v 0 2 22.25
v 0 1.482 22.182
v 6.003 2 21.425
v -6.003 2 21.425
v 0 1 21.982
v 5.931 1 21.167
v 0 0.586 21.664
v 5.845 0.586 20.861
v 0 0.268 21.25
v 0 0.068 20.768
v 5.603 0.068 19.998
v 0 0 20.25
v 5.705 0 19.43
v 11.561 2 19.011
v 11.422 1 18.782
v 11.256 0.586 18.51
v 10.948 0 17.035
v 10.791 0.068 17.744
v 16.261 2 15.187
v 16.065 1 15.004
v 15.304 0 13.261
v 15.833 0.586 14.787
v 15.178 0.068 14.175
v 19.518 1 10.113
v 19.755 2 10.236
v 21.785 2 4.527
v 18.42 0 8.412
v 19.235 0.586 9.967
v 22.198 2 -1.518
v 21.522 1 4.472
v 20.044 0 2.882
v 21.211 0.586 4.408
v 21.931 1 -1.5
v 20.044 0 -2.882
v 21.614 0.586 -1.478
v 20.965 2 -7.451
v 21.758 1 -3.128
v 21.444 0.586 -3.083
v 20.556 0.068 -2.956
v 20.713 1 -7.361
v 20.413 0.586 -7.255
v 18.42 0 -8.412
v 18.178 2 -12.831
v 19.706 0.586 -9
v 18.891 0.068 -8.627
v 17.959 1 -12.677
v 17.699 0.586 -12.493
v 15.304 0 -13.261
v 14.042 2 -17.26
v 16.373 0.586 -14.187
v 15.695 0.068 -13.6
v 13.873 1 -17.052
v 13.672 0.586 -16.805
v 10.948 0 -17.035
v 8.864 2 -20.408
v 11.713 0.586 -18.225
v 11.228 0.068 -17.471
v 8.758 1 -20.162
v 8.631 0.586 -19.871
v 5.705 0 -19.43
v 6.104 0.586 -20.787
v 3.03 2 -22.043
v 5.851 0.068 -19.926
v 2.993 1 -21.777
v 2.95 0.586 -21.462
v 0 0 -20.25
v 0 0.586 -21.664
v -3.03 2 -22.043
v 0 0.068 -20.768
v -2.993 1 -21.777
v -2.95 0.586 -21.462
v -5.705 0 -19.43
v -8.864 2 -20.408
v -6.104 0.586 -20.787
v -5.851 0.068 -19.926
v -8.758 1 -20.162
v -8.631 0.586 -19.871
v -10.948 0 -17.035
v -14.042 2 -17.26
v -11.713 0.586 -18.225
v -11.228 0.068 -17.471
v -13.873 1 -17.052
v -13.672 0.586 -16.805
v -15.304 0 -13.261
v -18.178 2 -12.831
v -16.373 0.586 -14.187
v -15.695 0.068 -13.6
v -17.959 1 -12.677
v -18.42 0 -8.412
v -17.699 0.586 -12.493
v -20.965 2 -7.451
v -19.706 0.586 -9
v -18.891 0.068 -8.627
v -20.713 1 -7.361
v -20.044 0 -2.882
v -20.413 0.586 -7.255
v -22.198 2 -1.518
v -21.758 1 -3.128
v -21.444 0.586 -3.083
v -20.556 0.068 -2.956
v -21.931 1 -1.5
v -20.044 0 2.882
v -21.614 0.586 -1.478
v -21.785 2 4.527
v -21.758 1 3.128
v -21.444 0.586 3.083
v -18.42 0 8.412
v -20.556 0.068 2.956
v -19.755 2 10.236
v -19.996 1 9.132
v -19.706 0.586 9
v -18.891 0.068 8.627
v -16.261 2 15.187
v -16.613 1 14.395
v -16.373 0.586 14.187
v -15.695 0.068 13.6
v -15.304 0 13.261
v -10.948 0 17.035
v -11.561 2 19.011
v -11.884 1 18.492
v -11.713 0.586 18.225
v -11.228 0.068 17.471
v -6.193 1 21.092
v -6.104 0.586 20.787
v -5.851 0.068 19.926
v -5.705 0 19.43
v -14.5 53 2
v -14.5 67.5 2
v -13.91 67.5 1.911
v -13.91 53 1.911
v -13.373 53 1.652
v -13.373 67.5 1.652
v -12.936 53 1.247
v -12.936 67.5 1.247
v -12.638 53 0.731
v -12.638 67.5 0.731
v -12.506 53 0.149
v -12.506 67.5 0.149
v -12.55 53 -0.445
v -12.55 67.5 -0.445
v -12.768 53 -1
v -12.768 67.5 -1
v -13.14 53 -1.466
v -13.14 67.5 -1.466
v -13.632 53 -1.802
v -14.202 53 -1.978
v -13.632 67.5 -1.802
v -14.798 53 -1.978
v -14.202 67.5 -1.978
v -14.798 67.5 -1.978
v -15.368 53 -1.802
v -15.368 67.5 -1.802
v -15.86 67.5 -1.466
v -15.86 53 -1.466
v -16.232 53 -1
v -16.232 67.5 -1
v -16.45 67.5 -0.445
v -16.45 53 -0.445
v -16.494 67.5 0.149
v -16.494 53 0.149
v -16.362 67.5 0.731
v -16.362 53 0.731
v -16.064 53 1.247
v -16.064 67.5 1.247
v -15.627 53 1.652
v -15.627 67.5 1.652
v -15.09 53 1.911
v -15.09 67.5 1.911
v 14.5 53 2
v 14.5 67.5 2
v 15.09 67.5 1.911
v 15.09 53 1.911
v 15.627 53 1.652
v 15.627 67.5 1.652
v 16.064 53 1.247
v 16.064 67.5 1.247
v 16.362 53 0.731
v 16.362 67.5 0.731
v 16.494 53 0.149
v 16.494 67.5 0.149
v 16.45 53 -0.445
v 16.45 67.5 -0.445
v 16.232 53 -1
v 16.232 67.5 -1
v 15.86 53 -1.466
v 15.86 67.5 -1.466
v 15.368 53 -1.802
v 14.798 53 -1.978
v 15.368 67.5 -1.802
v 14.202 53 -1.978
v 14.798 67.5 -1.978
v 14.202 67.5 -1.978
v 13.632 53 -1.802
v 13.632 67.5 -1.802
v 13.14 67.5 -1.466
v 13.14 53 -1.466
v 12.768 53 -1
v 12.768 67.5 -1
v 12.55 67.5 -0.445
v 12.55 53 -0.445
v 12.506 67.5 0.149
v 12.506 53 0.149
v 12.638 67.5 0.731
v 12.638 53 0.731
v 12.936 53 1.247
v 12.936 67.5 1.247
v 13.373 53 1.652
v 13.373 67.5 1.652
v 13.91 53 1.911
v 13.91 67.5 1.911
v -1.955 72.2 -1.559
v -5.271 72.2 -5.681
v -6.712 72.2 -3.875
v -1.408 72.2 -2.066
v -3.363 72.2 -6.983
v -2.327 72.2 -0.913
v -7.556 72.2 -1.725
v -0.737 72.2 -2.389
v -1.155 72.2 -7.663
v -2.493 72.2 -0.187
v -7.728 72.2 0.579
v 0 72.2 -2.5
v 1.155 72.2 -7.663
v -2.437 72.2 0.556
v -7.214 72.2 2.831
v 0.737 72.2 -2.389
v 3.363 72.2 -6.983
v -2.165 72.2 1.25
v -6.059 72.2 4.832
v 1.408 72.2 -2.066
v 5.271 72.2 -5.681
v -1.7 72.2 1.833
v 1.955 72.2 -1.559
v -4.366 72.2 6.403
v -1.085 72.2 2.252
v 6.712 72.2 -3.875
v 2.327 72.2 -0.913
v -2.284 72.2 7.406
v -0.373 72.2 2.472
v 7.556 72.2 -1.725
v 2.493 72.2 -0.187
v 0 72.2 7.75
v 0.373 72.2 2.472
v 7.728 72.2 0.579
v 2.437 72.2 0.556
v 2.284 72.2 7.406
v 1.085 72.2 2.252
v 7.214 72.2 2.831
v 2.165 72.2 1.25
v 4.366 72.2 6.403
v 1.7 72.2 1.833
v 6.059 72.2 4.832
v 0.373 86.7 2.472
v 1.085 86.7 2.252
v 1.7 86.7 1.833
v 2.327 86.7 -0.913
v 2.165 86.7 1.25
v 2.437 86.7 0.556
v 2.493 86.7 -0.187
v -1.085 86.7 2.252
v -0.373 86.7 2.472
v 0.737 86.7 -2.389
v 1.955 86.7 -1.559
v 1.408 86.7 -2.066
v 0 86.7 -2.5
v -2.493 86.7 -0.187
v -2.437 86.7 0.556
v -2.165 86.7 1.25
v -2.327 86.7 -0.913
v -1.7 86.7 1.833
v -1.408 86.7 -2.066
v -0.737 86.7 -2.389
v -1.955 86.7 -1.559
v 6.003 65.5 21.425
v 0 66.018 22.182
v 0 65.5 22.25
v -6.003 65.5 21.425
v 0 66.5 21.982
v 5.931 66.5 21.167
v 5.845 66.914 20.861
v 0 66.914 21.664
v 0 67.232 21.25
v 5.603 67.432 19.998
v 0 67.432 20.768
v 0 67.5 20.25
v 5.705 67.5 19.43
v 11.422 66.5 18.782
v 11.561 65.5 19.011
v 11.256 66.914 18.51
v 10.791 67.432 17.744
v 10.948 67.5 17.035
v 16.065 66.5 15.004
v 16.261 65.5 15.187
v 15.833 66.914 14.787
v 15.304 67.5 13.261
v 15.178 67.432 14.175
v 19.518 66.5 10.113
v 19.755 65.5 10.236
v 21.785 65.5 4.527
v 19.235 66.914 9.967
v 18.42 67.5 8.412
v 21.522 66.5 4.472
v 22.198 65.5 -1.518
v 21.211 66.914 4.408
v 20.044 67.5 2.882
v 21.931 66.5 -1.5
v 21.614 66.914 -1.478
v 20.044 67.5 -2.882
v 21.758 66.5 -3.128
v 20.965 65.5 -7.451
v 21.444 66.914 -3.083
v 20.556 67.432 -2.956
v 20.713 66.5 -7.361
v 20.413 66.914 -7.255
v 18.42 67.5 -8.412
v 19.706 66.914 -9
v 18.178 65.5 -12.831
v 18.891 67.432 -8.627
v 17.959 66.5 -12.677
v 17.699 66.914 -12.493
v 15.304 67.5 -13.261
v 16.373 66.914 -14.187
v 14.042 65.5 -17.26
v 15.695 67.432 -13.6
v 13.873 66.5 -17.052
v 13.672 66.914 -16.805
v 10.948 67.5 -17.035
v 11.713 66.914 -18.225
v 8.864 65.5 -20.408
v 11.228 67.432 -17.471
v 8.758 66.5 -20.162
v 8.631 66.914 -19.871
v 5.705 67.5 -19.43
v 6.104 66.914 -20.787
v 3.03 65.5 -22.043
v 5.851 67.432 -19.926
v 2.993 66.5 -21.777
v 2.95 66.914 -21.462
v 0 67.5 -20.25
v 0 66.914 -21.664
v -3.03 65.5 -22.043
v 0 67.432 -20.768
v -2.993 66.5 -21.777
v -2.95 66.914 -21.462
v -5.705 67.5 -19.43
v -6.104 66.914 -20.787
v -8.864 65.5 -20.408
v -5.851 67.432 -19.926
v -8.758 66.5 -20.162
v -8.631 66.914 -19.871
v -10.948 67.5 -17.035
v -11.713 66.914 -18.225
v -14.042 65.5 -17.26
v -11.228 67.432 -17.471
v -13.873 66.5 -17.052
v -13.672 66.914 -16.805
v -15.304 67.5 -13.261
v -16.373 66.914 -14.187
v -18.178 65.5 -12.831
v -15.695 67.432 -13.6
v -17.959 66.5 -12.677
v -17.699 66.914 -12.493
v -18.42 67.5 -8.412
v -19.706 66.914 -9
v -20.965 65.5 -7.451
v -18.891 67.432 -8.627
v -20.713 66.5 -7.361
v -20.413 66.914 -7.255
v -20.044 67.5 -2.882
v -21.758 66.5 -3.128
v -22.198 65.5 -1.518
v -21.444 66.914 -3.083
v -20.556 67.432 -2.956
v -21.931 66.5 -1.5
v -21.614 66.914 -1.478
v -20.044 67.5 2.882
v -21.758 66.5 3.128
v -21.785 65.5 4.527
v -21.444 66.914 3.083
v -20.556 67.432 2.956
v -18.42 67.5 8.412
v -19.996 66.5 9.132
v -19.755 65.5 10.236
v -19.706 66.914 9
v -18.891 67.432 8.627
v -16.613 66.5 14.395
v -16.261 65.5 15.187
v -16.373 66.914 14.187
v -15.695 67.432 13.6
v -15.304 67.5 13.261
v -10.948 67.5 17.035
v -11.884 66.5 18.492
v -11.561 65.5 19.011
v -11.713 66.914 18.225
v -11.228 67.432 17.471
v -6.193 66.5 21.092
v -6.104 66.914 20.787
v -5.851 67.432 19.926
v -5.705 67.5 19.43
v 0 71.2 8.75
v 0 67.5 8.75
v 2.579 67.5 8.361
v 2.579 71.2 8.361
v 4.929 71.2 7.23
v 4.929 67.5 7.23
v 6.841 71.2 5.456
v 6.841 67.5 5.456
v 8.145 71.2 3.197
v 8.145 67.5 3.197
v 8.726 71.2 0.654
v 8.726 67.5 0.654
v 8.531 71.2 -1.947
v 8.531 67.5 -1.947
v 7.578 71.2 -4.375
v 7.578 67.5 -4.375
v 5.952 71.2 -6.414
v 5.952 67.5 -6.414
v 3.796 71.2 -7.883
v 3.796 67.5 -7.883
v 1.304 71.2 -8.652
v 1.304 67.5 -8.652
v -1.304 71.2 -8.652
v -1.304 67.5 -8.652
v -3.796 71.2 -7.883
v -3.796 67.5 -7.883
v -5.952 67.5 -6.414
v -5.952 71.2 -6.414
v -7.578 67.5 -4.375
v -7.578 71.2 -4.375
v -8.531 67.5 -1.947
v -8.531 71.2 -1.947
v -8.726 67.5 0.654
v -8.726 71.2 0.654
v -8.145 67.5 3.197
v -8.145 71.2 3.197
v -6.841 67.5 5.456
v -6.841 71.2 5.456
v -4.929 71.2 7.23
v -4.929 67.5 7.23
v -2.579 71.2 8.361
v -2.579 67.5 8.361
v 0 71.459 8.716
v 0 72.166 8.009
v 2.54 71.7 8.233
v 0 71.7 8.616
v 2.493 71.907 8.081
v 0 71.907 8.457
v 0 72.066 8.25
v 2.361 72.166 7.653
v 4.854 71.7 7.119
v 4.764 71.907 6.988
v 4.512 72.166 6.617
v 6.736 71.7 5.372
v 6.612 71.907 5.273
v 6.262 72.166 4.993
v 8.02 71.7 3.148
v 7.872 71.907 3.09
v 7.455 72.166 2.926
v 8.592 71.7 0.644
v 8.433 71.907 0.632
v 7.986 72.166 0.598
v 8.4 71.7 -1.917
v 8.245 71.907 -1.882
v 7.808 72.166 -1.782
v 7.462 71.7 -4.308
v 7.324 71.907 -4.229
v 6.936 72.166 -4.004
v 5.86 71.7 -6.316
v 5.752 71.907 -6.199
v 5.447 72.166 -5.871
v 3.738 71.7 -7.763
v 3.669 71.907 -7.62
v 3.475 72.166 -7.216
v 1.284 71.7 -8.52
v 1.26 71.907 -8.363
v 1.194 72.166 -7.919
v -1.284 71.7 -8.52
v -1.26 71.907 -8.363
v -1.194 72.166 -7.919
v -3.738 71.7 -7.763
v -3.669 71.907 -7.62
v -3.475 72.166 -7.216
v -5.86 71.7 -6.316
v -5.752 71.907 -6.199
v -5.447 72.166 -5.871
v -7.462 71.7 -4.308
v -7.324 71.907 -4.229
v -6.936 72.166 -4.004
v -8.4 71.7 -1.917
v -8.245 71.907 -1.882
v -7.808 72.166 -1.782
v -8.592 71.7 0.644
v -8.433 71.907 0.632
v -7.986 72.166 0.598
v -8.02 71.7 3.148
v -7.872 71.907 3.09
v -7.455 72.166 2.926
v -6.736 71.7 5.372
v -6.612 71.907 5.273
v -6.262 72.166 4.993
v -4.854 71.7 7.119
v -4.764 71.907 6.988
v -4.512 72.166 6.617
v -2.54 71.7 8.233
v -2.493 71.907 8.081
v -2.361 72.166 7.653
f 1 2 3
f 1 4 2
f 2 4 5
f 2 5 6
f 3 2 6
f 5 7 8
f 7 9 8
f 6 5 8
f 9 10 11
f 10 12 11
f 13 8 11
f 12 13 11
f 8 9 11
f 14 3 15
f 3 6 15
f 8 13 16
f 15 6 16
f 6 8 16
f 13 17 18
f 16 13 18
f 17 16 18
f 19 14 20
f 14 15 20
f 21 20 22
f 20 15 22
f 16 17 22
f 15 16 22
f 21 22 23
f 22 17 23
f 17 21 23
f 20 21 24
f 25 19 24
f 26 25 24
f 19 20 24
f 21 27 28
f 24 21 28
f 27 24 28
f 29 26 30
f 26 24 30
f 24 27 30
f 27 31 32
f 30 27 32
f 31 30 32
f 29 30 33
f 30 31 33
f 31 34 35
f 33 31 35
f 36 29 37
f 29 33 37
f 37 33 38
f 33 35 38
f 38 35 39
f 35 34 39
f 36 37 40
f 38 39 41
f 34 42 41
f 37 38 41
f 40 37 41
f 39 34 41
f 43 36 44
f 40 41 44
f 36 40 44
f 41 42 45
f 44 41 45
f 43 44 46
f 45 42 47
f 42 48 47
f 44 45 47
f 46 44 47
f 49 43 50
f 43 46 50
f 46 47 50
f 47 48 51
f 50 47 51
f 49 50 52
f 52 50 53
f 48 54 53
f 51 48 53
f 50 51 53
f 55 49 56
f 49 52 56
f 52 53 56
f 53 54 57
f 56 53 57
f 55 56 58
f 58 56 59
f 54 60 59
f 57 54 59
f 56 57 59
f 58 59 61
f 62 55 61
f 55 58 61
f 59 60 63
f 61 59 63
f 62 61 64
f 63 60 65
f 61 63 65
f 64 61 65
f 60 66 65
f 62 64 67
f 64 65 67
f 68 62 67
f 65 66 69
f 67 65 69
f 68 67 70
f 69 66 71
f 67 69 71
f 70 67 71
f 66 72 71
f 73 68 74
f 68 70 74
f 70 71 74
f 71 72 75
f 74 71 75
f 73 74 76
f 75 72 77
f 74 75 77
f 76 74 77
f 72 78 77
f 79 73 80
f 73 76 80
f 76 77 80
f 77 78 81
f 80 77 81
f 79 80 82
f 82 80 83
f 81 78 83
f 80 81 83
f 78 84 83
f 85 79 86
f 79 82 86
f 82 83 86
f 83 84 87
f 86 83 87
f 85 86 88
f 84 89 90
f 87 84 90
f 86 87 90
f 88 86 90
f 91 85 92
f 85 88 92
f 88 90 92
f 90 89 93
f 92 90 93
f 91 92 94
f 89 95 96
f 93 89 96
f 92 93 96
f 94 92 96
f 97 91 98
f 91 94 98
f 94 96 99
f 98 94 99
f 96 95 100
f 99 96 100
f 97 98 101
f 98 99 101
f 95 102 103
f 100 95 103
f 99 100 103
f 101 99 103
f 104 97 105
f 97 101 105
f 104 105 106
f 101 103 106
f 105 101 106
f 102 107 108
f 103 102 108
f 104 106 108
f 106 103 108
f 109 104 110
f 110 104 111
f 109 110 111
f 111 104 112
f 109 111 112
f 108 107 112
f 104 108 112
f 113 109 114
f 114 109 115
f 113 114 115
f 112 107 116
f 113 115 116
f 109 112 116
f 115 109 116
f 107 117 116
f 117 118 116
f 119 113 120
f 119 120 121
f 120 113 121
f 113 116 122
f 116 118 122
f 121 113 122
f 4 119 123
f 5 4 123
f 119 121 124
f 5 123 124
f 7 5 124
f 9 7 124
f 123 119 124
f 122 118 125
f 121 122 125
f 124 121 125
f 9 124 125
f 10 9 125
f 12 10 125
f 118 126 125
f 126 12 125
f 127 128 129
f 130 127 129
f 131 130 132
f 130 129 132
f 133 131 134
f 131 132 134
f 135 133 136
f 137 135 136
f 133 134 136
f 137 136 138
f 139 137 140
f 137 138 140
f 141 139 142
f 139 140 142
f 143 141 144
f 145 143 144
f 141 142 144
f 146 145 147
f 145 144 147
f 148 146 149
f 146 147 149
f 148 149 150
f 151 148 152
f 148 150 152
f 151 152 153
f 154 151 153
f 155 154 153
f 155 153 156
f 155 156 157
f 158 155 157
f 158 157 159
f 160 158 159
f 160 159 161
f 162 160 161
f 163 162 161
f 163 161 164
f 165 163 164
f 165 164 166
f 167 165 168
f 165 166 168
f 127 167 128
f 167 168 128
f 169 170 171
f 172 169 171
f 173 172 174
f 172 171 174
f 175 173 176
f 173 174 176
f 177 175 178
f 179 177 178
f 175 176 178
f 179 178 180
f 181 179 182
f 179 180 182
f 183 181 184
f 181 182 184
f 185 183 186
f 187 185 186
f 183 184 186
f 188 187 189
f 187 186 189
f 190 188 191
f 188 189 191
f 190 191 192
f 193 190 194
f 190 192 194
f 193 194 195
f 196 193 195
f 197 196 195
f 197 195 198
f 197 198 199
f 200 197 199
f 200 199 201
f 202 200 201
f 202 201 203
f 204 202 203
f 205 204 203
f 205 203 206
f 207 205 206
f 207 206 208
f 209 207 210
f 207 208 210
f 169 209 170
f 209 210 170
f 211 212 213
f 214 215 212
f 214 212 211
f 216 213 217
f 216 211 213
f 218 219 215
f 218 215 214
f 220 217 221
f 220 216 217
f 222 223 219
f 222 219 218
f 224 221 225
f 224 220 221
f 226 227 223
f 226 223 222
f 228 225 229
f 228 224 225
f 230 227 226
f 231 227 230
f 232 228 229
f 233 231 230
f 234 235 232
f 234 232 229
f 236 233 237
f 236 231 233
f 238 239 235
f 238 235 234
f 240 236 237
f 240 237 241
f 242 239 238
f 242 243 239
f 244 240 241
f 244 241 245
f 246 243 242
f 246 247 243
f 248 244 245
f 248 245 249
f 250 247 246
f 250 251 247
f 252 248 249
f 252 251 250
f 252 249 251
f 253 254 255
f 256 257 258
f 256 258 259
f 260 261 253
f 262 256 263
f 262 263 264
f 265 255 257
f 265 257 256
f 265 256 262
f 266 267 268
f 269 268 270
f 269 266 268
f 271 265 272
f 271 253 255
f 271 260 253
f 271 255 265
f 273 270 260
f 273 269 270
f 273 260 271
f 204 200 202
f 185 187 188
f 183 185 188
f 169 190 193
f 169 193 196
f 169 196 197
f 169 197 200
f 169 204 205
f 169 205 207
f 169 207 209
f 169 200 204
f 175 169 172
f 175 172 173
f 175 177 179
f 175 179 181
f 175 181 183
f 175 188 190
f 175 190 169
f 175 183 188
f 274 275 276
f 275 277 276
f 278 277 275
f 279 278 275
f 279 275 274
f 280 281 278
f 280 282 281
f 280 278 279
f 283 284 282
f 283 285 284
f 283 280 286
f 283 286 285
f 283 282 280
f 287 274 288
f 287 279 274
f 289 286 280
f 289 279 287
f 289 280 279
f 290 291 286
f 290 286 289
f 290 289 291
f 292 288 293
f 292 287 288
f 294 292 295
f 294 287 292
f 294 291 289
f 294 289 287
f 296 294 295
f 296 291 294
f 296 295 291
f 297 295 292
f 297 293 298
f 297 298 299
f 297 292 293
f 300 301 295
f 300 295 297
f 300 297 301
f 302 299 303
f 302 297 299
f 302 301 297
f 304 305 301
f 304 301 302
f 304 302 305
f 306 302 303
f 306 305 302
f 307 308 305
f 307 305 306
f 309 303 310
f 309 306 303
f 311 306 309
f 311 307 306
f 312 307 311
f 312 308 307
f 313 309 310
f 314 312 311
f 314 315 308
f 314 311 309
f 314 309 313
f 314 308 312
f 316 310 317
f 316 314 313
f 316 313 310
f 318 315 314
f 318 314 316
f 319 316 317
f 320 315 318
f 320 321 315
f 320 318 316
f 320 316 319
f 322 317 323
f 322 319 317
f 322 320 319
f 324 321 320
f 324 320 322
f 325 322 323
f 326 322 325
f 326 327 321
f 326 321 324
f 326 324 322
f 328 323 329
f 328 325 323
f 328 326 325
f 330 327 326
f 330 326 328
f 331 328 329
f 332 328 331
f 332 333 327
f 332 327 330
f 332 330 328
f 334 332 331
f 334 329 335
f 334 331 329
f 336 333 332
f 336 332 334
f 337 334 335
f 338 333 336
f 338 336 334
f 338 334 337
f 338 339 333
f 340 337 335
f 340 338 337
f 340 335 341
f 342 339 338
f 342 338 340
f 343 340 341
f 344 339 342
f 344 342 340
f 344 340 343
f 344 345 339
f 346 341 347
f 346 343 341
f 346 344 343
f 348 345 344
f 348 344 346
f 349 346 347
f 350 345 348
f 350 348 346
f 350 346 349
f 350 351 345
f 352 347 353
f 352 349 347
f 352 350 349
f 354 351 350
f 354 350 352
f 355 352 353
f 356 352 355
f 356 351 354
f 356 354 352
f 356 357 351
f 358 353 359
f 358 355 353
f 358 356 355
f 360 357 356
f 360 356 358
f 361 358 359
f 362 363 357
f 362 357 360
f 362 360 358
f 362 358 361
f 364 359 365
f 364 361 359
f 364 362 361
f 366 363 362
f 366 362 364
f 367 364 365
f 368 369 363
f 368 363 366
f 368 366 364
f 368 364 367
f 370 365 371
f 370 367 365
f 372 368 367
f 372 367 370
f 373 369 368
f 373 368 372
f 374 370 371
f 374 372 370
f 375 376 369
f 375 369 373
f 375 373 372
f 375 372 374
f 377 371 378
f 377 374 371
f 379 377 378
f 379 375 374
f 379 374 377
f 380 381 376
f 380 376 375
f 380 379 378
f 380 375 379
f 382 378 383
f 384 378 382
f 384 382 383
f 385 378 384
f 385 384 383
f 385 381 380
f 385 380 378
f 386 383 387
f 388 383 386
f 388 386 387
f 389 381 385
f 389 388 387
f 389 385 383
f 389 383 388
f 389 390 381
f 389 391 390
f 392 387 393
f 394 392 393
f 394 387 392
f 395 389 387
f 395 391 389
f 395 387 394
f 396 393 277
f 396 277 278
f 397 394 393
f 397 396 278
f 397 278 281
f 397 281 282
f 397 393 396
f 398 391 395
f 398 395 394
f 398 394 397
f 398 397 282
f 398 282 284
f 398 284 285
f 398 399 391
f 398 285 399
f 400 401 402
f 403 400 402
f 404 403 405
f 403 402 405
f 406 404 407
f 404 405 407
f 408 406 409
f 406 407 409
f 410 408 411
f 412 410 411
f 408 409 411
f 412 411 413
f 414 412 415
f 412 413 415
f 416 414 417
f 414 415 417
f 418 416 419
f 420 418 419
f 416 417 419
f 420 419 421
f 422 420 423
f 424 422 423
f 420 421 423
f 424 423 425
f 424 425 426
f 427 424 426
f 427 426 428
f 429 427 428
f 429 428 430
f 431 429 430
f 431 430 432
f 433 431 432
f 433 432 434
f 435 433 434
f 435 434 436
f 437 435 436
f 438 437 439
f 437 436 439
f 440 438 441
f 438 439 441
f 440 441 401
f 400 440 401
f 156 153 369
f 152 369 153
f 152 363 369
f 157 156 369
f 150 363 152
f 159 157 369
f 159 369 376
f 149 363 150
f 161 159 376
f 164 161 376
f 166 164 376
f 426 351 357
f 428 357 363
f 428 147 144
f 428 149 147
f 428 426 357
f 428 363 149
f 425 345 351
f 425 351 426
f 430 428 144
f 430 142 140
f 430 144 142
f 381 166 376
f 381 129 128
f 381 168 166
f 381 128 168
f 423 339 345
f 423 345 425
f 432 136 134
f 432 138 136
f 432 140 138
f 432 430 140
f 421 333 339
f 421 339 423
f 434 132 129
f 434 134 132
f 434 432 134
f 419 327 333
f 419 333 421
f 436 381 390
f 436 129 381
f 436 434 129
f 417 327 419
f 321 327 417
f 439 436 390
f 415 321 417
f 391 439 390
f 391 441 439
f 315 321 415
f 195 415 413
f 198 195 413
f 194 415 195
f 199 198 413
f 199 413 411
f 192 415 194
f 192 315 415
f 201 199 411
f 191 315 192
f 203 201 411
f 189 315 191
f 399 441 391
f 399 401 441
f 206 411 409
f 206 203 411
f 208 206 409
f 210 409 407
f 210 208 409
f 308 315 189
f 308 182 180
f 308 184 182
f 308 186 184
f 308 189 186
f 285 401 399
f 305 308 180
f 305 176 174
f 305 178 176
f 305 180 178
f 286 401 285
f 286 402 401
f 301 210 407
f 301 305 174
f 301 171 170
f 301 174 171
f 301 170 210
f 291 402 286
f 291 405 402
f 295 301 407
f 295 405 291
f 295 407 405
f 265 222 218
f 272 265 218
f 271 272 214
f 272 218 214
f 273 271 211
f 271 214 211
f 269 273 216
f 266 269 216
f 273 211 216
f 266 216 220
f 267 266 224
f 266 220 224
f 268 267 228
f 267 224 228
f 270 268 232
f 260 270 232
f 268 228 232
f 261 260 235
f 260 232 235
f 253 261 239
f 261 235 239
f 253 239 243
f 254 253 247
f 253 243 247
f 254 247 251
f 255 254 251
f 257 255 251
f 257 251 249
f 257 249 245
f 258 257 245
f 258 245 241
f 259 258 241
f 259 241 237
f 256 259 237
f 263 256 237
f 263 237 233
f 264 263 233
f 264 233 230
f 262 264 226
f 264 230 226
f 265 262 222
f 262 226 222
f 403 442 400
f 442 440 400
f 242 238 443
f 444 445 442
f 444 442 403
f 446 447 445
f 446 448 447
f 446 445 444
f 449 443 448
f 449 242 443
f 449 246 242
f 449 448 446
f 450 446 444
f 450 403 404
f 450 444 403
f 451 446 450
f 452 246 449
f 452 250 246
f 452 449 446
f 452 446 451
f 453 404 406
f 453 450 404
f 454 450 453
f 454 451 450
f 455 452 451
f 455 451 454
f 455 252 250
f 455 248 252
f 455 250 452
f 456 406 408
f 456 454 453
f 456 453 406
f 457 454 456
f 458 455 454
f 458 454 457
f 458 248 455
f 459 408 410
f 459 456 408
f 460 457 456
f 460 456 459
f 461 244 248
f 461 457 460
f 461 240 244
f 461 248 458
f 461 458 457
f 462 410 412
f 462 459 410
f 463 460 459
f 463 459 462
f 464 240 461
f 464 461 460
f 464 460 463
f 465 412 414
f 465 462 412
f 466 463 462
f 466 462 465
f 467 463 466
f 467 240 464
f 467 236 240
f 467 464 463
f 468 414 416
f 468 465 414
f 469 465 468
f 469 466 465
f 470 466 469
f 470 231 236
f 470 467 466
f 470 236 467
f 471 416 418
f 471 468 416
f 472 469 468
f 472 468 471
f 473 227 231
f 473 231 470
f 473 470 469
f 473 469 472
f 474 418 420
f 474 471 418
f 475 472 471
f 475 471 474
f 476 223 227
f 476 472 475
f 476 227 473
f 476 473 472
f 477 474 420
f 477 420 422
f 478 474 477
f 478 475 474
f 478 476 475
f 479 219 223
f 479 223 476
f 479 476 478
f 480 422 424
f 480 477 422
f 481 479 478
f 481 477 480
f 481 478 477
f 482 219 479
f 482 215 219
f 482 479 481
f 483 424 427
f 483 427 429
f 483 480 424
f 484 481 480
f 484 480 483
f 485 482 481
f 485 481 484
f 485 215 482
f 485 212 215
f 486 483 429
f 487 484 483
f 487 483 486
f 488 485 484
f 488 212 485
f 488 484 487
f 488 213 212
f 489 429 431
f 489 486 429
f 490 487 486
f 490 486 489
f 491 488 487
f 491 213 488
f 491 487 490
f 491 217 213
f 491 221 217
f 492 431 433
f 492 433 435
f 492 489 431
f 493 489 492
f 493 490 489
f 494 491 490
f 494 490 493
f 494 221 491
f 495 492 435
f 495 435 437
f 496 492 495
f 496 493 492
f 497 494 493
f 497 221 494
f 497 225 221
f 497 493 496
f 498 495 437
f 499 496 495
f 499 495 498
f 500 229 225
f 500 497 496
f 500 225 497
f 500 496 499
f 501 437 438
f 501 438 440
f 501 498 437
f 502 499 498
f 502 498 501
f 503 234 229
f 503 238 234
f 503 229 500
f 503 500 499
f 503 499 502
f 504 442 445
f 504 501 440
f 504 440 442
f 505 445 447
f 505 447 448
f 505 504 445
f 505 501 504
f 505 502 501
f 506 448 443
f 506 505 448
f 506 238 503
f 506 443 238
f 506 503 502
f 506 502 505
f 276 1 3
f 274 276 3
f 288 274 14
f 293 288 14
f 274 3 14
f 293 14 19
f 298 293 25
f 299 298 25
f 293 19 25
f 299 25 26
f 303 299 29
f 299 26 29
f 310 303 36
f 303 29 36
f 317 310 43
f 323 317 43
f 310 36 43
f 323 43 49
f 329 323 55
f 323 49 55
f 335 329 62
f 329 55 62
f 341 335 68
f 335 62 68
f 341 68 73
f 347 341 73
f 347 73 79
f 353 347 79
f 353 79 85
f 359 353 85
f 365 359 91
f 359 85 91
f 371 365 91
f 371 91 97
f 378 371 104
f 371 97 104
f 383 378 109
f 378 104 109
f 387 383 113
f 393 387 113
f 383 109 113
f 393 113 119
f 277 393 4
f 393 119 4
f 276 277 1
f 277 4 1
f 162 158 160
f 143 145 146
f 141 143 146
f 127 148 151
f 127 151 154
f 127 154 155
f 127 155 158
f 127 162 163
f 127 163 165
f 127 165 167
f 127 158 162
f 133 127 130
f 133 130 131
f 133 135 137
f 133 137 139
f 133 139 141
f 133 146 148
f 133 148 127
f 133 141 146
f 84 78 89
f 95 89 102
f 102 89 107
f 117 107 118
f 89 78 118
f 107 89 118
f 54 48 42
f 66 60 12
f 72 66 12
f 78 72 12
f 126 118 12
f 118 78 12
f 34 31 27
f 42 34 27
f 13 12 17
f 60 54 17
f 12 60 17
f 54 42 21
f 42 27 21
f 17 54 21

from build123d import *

# Parameters (mm, degrees)
SKETCH1_R           = 22.25
BOSS_EXTRUDE1_DEPTH = 67.5
SKETCH2_R           = 8.75
BOSS_EXTRUDE2_DEPTH = 4.7
SKETCH3_R           = 2.5
BOSS_EXTRUDE3_DEPTH = 14.5
SKETCH4_R           = 2
CUT_EXTRUDE1_DEPTH  = 14.5
FILLET1_R           = 2
FILLET2_R           = 1


with BuildPart() as part:
    # Sketch1 → Boss-Extrude1 (new body)
    with BuildSketch(Plane(origin=(0, 0, 0), x_dir=(1, 0, 0), z_dir=(0, 1, 0))):
        with Locations(Location((0, 0, 0), (0, 0, 270))):
            Circle(SKETCH1_R)
    extrude(amount=BOSS_EXTRUDE1_DEPTH)

    # Sketch2 → Boss-Extrude2 (add)
    with BuildSketch(Plane(origin=(0, 67.5, 0), x_dir=(1, 0, 0), z_dir=(0, 1, 0))):
        with Locations(Location((0, 0, 0), (0, 0, 270))):
            Circle(SKETCH2_R)
    extrude(amount=BOSS_EXTRUDE2_DEPTH)

    # Sketch3 → Boss-Extrude3 (add)
    with BuildSketch(Plane(origin=(0, 72.2, 0), x_dir=(1, 0, 0), z_dir=(0, 1, 0))):
        with Locations(Location((0, 0, 0), (0, 0, 90))):
            Circle(SKETCH3_R)
    extrude(amount=BOSS_EXTRUDE3_DEPTH)

    # Sketch4 → Cut-Extrude1 (cut)
    with BuildSketch(Plane(origin=(0, 67.5, 0), x_dir=(1, 0, 0), z_dir=(0, 1, 0))):
        with Locations(Location((14.5, 0, 0), (0, 0, 270))):
            Circle(SKETCH4_R)
        with Locations(Location((-14.5, 0, 0), (0, 0, 270))):
            Circle(SKETCH4_R)
    extrude(amount=-CUT_EXTRUDE1_DEPTH, mode=Mode.SUBTRACT)

    # Fillet1
    fillet1_edges = [part.edges().sort_by_distance(p)[0] for p in [
        (0, 0, -22.25),
        (0, 67.5, -22.25),
    ]]
    fillet(fillet1_edges, radius=FILLET1_R)

    # Fillet2
    fillet2_edges = [part.edges().sort_by_distance(p)[0] for p in [
        (0, 72.2, -8.75),
    ]]
    fillet(fillet2_edges, radius=FILLET2_R)


solid = part.part
